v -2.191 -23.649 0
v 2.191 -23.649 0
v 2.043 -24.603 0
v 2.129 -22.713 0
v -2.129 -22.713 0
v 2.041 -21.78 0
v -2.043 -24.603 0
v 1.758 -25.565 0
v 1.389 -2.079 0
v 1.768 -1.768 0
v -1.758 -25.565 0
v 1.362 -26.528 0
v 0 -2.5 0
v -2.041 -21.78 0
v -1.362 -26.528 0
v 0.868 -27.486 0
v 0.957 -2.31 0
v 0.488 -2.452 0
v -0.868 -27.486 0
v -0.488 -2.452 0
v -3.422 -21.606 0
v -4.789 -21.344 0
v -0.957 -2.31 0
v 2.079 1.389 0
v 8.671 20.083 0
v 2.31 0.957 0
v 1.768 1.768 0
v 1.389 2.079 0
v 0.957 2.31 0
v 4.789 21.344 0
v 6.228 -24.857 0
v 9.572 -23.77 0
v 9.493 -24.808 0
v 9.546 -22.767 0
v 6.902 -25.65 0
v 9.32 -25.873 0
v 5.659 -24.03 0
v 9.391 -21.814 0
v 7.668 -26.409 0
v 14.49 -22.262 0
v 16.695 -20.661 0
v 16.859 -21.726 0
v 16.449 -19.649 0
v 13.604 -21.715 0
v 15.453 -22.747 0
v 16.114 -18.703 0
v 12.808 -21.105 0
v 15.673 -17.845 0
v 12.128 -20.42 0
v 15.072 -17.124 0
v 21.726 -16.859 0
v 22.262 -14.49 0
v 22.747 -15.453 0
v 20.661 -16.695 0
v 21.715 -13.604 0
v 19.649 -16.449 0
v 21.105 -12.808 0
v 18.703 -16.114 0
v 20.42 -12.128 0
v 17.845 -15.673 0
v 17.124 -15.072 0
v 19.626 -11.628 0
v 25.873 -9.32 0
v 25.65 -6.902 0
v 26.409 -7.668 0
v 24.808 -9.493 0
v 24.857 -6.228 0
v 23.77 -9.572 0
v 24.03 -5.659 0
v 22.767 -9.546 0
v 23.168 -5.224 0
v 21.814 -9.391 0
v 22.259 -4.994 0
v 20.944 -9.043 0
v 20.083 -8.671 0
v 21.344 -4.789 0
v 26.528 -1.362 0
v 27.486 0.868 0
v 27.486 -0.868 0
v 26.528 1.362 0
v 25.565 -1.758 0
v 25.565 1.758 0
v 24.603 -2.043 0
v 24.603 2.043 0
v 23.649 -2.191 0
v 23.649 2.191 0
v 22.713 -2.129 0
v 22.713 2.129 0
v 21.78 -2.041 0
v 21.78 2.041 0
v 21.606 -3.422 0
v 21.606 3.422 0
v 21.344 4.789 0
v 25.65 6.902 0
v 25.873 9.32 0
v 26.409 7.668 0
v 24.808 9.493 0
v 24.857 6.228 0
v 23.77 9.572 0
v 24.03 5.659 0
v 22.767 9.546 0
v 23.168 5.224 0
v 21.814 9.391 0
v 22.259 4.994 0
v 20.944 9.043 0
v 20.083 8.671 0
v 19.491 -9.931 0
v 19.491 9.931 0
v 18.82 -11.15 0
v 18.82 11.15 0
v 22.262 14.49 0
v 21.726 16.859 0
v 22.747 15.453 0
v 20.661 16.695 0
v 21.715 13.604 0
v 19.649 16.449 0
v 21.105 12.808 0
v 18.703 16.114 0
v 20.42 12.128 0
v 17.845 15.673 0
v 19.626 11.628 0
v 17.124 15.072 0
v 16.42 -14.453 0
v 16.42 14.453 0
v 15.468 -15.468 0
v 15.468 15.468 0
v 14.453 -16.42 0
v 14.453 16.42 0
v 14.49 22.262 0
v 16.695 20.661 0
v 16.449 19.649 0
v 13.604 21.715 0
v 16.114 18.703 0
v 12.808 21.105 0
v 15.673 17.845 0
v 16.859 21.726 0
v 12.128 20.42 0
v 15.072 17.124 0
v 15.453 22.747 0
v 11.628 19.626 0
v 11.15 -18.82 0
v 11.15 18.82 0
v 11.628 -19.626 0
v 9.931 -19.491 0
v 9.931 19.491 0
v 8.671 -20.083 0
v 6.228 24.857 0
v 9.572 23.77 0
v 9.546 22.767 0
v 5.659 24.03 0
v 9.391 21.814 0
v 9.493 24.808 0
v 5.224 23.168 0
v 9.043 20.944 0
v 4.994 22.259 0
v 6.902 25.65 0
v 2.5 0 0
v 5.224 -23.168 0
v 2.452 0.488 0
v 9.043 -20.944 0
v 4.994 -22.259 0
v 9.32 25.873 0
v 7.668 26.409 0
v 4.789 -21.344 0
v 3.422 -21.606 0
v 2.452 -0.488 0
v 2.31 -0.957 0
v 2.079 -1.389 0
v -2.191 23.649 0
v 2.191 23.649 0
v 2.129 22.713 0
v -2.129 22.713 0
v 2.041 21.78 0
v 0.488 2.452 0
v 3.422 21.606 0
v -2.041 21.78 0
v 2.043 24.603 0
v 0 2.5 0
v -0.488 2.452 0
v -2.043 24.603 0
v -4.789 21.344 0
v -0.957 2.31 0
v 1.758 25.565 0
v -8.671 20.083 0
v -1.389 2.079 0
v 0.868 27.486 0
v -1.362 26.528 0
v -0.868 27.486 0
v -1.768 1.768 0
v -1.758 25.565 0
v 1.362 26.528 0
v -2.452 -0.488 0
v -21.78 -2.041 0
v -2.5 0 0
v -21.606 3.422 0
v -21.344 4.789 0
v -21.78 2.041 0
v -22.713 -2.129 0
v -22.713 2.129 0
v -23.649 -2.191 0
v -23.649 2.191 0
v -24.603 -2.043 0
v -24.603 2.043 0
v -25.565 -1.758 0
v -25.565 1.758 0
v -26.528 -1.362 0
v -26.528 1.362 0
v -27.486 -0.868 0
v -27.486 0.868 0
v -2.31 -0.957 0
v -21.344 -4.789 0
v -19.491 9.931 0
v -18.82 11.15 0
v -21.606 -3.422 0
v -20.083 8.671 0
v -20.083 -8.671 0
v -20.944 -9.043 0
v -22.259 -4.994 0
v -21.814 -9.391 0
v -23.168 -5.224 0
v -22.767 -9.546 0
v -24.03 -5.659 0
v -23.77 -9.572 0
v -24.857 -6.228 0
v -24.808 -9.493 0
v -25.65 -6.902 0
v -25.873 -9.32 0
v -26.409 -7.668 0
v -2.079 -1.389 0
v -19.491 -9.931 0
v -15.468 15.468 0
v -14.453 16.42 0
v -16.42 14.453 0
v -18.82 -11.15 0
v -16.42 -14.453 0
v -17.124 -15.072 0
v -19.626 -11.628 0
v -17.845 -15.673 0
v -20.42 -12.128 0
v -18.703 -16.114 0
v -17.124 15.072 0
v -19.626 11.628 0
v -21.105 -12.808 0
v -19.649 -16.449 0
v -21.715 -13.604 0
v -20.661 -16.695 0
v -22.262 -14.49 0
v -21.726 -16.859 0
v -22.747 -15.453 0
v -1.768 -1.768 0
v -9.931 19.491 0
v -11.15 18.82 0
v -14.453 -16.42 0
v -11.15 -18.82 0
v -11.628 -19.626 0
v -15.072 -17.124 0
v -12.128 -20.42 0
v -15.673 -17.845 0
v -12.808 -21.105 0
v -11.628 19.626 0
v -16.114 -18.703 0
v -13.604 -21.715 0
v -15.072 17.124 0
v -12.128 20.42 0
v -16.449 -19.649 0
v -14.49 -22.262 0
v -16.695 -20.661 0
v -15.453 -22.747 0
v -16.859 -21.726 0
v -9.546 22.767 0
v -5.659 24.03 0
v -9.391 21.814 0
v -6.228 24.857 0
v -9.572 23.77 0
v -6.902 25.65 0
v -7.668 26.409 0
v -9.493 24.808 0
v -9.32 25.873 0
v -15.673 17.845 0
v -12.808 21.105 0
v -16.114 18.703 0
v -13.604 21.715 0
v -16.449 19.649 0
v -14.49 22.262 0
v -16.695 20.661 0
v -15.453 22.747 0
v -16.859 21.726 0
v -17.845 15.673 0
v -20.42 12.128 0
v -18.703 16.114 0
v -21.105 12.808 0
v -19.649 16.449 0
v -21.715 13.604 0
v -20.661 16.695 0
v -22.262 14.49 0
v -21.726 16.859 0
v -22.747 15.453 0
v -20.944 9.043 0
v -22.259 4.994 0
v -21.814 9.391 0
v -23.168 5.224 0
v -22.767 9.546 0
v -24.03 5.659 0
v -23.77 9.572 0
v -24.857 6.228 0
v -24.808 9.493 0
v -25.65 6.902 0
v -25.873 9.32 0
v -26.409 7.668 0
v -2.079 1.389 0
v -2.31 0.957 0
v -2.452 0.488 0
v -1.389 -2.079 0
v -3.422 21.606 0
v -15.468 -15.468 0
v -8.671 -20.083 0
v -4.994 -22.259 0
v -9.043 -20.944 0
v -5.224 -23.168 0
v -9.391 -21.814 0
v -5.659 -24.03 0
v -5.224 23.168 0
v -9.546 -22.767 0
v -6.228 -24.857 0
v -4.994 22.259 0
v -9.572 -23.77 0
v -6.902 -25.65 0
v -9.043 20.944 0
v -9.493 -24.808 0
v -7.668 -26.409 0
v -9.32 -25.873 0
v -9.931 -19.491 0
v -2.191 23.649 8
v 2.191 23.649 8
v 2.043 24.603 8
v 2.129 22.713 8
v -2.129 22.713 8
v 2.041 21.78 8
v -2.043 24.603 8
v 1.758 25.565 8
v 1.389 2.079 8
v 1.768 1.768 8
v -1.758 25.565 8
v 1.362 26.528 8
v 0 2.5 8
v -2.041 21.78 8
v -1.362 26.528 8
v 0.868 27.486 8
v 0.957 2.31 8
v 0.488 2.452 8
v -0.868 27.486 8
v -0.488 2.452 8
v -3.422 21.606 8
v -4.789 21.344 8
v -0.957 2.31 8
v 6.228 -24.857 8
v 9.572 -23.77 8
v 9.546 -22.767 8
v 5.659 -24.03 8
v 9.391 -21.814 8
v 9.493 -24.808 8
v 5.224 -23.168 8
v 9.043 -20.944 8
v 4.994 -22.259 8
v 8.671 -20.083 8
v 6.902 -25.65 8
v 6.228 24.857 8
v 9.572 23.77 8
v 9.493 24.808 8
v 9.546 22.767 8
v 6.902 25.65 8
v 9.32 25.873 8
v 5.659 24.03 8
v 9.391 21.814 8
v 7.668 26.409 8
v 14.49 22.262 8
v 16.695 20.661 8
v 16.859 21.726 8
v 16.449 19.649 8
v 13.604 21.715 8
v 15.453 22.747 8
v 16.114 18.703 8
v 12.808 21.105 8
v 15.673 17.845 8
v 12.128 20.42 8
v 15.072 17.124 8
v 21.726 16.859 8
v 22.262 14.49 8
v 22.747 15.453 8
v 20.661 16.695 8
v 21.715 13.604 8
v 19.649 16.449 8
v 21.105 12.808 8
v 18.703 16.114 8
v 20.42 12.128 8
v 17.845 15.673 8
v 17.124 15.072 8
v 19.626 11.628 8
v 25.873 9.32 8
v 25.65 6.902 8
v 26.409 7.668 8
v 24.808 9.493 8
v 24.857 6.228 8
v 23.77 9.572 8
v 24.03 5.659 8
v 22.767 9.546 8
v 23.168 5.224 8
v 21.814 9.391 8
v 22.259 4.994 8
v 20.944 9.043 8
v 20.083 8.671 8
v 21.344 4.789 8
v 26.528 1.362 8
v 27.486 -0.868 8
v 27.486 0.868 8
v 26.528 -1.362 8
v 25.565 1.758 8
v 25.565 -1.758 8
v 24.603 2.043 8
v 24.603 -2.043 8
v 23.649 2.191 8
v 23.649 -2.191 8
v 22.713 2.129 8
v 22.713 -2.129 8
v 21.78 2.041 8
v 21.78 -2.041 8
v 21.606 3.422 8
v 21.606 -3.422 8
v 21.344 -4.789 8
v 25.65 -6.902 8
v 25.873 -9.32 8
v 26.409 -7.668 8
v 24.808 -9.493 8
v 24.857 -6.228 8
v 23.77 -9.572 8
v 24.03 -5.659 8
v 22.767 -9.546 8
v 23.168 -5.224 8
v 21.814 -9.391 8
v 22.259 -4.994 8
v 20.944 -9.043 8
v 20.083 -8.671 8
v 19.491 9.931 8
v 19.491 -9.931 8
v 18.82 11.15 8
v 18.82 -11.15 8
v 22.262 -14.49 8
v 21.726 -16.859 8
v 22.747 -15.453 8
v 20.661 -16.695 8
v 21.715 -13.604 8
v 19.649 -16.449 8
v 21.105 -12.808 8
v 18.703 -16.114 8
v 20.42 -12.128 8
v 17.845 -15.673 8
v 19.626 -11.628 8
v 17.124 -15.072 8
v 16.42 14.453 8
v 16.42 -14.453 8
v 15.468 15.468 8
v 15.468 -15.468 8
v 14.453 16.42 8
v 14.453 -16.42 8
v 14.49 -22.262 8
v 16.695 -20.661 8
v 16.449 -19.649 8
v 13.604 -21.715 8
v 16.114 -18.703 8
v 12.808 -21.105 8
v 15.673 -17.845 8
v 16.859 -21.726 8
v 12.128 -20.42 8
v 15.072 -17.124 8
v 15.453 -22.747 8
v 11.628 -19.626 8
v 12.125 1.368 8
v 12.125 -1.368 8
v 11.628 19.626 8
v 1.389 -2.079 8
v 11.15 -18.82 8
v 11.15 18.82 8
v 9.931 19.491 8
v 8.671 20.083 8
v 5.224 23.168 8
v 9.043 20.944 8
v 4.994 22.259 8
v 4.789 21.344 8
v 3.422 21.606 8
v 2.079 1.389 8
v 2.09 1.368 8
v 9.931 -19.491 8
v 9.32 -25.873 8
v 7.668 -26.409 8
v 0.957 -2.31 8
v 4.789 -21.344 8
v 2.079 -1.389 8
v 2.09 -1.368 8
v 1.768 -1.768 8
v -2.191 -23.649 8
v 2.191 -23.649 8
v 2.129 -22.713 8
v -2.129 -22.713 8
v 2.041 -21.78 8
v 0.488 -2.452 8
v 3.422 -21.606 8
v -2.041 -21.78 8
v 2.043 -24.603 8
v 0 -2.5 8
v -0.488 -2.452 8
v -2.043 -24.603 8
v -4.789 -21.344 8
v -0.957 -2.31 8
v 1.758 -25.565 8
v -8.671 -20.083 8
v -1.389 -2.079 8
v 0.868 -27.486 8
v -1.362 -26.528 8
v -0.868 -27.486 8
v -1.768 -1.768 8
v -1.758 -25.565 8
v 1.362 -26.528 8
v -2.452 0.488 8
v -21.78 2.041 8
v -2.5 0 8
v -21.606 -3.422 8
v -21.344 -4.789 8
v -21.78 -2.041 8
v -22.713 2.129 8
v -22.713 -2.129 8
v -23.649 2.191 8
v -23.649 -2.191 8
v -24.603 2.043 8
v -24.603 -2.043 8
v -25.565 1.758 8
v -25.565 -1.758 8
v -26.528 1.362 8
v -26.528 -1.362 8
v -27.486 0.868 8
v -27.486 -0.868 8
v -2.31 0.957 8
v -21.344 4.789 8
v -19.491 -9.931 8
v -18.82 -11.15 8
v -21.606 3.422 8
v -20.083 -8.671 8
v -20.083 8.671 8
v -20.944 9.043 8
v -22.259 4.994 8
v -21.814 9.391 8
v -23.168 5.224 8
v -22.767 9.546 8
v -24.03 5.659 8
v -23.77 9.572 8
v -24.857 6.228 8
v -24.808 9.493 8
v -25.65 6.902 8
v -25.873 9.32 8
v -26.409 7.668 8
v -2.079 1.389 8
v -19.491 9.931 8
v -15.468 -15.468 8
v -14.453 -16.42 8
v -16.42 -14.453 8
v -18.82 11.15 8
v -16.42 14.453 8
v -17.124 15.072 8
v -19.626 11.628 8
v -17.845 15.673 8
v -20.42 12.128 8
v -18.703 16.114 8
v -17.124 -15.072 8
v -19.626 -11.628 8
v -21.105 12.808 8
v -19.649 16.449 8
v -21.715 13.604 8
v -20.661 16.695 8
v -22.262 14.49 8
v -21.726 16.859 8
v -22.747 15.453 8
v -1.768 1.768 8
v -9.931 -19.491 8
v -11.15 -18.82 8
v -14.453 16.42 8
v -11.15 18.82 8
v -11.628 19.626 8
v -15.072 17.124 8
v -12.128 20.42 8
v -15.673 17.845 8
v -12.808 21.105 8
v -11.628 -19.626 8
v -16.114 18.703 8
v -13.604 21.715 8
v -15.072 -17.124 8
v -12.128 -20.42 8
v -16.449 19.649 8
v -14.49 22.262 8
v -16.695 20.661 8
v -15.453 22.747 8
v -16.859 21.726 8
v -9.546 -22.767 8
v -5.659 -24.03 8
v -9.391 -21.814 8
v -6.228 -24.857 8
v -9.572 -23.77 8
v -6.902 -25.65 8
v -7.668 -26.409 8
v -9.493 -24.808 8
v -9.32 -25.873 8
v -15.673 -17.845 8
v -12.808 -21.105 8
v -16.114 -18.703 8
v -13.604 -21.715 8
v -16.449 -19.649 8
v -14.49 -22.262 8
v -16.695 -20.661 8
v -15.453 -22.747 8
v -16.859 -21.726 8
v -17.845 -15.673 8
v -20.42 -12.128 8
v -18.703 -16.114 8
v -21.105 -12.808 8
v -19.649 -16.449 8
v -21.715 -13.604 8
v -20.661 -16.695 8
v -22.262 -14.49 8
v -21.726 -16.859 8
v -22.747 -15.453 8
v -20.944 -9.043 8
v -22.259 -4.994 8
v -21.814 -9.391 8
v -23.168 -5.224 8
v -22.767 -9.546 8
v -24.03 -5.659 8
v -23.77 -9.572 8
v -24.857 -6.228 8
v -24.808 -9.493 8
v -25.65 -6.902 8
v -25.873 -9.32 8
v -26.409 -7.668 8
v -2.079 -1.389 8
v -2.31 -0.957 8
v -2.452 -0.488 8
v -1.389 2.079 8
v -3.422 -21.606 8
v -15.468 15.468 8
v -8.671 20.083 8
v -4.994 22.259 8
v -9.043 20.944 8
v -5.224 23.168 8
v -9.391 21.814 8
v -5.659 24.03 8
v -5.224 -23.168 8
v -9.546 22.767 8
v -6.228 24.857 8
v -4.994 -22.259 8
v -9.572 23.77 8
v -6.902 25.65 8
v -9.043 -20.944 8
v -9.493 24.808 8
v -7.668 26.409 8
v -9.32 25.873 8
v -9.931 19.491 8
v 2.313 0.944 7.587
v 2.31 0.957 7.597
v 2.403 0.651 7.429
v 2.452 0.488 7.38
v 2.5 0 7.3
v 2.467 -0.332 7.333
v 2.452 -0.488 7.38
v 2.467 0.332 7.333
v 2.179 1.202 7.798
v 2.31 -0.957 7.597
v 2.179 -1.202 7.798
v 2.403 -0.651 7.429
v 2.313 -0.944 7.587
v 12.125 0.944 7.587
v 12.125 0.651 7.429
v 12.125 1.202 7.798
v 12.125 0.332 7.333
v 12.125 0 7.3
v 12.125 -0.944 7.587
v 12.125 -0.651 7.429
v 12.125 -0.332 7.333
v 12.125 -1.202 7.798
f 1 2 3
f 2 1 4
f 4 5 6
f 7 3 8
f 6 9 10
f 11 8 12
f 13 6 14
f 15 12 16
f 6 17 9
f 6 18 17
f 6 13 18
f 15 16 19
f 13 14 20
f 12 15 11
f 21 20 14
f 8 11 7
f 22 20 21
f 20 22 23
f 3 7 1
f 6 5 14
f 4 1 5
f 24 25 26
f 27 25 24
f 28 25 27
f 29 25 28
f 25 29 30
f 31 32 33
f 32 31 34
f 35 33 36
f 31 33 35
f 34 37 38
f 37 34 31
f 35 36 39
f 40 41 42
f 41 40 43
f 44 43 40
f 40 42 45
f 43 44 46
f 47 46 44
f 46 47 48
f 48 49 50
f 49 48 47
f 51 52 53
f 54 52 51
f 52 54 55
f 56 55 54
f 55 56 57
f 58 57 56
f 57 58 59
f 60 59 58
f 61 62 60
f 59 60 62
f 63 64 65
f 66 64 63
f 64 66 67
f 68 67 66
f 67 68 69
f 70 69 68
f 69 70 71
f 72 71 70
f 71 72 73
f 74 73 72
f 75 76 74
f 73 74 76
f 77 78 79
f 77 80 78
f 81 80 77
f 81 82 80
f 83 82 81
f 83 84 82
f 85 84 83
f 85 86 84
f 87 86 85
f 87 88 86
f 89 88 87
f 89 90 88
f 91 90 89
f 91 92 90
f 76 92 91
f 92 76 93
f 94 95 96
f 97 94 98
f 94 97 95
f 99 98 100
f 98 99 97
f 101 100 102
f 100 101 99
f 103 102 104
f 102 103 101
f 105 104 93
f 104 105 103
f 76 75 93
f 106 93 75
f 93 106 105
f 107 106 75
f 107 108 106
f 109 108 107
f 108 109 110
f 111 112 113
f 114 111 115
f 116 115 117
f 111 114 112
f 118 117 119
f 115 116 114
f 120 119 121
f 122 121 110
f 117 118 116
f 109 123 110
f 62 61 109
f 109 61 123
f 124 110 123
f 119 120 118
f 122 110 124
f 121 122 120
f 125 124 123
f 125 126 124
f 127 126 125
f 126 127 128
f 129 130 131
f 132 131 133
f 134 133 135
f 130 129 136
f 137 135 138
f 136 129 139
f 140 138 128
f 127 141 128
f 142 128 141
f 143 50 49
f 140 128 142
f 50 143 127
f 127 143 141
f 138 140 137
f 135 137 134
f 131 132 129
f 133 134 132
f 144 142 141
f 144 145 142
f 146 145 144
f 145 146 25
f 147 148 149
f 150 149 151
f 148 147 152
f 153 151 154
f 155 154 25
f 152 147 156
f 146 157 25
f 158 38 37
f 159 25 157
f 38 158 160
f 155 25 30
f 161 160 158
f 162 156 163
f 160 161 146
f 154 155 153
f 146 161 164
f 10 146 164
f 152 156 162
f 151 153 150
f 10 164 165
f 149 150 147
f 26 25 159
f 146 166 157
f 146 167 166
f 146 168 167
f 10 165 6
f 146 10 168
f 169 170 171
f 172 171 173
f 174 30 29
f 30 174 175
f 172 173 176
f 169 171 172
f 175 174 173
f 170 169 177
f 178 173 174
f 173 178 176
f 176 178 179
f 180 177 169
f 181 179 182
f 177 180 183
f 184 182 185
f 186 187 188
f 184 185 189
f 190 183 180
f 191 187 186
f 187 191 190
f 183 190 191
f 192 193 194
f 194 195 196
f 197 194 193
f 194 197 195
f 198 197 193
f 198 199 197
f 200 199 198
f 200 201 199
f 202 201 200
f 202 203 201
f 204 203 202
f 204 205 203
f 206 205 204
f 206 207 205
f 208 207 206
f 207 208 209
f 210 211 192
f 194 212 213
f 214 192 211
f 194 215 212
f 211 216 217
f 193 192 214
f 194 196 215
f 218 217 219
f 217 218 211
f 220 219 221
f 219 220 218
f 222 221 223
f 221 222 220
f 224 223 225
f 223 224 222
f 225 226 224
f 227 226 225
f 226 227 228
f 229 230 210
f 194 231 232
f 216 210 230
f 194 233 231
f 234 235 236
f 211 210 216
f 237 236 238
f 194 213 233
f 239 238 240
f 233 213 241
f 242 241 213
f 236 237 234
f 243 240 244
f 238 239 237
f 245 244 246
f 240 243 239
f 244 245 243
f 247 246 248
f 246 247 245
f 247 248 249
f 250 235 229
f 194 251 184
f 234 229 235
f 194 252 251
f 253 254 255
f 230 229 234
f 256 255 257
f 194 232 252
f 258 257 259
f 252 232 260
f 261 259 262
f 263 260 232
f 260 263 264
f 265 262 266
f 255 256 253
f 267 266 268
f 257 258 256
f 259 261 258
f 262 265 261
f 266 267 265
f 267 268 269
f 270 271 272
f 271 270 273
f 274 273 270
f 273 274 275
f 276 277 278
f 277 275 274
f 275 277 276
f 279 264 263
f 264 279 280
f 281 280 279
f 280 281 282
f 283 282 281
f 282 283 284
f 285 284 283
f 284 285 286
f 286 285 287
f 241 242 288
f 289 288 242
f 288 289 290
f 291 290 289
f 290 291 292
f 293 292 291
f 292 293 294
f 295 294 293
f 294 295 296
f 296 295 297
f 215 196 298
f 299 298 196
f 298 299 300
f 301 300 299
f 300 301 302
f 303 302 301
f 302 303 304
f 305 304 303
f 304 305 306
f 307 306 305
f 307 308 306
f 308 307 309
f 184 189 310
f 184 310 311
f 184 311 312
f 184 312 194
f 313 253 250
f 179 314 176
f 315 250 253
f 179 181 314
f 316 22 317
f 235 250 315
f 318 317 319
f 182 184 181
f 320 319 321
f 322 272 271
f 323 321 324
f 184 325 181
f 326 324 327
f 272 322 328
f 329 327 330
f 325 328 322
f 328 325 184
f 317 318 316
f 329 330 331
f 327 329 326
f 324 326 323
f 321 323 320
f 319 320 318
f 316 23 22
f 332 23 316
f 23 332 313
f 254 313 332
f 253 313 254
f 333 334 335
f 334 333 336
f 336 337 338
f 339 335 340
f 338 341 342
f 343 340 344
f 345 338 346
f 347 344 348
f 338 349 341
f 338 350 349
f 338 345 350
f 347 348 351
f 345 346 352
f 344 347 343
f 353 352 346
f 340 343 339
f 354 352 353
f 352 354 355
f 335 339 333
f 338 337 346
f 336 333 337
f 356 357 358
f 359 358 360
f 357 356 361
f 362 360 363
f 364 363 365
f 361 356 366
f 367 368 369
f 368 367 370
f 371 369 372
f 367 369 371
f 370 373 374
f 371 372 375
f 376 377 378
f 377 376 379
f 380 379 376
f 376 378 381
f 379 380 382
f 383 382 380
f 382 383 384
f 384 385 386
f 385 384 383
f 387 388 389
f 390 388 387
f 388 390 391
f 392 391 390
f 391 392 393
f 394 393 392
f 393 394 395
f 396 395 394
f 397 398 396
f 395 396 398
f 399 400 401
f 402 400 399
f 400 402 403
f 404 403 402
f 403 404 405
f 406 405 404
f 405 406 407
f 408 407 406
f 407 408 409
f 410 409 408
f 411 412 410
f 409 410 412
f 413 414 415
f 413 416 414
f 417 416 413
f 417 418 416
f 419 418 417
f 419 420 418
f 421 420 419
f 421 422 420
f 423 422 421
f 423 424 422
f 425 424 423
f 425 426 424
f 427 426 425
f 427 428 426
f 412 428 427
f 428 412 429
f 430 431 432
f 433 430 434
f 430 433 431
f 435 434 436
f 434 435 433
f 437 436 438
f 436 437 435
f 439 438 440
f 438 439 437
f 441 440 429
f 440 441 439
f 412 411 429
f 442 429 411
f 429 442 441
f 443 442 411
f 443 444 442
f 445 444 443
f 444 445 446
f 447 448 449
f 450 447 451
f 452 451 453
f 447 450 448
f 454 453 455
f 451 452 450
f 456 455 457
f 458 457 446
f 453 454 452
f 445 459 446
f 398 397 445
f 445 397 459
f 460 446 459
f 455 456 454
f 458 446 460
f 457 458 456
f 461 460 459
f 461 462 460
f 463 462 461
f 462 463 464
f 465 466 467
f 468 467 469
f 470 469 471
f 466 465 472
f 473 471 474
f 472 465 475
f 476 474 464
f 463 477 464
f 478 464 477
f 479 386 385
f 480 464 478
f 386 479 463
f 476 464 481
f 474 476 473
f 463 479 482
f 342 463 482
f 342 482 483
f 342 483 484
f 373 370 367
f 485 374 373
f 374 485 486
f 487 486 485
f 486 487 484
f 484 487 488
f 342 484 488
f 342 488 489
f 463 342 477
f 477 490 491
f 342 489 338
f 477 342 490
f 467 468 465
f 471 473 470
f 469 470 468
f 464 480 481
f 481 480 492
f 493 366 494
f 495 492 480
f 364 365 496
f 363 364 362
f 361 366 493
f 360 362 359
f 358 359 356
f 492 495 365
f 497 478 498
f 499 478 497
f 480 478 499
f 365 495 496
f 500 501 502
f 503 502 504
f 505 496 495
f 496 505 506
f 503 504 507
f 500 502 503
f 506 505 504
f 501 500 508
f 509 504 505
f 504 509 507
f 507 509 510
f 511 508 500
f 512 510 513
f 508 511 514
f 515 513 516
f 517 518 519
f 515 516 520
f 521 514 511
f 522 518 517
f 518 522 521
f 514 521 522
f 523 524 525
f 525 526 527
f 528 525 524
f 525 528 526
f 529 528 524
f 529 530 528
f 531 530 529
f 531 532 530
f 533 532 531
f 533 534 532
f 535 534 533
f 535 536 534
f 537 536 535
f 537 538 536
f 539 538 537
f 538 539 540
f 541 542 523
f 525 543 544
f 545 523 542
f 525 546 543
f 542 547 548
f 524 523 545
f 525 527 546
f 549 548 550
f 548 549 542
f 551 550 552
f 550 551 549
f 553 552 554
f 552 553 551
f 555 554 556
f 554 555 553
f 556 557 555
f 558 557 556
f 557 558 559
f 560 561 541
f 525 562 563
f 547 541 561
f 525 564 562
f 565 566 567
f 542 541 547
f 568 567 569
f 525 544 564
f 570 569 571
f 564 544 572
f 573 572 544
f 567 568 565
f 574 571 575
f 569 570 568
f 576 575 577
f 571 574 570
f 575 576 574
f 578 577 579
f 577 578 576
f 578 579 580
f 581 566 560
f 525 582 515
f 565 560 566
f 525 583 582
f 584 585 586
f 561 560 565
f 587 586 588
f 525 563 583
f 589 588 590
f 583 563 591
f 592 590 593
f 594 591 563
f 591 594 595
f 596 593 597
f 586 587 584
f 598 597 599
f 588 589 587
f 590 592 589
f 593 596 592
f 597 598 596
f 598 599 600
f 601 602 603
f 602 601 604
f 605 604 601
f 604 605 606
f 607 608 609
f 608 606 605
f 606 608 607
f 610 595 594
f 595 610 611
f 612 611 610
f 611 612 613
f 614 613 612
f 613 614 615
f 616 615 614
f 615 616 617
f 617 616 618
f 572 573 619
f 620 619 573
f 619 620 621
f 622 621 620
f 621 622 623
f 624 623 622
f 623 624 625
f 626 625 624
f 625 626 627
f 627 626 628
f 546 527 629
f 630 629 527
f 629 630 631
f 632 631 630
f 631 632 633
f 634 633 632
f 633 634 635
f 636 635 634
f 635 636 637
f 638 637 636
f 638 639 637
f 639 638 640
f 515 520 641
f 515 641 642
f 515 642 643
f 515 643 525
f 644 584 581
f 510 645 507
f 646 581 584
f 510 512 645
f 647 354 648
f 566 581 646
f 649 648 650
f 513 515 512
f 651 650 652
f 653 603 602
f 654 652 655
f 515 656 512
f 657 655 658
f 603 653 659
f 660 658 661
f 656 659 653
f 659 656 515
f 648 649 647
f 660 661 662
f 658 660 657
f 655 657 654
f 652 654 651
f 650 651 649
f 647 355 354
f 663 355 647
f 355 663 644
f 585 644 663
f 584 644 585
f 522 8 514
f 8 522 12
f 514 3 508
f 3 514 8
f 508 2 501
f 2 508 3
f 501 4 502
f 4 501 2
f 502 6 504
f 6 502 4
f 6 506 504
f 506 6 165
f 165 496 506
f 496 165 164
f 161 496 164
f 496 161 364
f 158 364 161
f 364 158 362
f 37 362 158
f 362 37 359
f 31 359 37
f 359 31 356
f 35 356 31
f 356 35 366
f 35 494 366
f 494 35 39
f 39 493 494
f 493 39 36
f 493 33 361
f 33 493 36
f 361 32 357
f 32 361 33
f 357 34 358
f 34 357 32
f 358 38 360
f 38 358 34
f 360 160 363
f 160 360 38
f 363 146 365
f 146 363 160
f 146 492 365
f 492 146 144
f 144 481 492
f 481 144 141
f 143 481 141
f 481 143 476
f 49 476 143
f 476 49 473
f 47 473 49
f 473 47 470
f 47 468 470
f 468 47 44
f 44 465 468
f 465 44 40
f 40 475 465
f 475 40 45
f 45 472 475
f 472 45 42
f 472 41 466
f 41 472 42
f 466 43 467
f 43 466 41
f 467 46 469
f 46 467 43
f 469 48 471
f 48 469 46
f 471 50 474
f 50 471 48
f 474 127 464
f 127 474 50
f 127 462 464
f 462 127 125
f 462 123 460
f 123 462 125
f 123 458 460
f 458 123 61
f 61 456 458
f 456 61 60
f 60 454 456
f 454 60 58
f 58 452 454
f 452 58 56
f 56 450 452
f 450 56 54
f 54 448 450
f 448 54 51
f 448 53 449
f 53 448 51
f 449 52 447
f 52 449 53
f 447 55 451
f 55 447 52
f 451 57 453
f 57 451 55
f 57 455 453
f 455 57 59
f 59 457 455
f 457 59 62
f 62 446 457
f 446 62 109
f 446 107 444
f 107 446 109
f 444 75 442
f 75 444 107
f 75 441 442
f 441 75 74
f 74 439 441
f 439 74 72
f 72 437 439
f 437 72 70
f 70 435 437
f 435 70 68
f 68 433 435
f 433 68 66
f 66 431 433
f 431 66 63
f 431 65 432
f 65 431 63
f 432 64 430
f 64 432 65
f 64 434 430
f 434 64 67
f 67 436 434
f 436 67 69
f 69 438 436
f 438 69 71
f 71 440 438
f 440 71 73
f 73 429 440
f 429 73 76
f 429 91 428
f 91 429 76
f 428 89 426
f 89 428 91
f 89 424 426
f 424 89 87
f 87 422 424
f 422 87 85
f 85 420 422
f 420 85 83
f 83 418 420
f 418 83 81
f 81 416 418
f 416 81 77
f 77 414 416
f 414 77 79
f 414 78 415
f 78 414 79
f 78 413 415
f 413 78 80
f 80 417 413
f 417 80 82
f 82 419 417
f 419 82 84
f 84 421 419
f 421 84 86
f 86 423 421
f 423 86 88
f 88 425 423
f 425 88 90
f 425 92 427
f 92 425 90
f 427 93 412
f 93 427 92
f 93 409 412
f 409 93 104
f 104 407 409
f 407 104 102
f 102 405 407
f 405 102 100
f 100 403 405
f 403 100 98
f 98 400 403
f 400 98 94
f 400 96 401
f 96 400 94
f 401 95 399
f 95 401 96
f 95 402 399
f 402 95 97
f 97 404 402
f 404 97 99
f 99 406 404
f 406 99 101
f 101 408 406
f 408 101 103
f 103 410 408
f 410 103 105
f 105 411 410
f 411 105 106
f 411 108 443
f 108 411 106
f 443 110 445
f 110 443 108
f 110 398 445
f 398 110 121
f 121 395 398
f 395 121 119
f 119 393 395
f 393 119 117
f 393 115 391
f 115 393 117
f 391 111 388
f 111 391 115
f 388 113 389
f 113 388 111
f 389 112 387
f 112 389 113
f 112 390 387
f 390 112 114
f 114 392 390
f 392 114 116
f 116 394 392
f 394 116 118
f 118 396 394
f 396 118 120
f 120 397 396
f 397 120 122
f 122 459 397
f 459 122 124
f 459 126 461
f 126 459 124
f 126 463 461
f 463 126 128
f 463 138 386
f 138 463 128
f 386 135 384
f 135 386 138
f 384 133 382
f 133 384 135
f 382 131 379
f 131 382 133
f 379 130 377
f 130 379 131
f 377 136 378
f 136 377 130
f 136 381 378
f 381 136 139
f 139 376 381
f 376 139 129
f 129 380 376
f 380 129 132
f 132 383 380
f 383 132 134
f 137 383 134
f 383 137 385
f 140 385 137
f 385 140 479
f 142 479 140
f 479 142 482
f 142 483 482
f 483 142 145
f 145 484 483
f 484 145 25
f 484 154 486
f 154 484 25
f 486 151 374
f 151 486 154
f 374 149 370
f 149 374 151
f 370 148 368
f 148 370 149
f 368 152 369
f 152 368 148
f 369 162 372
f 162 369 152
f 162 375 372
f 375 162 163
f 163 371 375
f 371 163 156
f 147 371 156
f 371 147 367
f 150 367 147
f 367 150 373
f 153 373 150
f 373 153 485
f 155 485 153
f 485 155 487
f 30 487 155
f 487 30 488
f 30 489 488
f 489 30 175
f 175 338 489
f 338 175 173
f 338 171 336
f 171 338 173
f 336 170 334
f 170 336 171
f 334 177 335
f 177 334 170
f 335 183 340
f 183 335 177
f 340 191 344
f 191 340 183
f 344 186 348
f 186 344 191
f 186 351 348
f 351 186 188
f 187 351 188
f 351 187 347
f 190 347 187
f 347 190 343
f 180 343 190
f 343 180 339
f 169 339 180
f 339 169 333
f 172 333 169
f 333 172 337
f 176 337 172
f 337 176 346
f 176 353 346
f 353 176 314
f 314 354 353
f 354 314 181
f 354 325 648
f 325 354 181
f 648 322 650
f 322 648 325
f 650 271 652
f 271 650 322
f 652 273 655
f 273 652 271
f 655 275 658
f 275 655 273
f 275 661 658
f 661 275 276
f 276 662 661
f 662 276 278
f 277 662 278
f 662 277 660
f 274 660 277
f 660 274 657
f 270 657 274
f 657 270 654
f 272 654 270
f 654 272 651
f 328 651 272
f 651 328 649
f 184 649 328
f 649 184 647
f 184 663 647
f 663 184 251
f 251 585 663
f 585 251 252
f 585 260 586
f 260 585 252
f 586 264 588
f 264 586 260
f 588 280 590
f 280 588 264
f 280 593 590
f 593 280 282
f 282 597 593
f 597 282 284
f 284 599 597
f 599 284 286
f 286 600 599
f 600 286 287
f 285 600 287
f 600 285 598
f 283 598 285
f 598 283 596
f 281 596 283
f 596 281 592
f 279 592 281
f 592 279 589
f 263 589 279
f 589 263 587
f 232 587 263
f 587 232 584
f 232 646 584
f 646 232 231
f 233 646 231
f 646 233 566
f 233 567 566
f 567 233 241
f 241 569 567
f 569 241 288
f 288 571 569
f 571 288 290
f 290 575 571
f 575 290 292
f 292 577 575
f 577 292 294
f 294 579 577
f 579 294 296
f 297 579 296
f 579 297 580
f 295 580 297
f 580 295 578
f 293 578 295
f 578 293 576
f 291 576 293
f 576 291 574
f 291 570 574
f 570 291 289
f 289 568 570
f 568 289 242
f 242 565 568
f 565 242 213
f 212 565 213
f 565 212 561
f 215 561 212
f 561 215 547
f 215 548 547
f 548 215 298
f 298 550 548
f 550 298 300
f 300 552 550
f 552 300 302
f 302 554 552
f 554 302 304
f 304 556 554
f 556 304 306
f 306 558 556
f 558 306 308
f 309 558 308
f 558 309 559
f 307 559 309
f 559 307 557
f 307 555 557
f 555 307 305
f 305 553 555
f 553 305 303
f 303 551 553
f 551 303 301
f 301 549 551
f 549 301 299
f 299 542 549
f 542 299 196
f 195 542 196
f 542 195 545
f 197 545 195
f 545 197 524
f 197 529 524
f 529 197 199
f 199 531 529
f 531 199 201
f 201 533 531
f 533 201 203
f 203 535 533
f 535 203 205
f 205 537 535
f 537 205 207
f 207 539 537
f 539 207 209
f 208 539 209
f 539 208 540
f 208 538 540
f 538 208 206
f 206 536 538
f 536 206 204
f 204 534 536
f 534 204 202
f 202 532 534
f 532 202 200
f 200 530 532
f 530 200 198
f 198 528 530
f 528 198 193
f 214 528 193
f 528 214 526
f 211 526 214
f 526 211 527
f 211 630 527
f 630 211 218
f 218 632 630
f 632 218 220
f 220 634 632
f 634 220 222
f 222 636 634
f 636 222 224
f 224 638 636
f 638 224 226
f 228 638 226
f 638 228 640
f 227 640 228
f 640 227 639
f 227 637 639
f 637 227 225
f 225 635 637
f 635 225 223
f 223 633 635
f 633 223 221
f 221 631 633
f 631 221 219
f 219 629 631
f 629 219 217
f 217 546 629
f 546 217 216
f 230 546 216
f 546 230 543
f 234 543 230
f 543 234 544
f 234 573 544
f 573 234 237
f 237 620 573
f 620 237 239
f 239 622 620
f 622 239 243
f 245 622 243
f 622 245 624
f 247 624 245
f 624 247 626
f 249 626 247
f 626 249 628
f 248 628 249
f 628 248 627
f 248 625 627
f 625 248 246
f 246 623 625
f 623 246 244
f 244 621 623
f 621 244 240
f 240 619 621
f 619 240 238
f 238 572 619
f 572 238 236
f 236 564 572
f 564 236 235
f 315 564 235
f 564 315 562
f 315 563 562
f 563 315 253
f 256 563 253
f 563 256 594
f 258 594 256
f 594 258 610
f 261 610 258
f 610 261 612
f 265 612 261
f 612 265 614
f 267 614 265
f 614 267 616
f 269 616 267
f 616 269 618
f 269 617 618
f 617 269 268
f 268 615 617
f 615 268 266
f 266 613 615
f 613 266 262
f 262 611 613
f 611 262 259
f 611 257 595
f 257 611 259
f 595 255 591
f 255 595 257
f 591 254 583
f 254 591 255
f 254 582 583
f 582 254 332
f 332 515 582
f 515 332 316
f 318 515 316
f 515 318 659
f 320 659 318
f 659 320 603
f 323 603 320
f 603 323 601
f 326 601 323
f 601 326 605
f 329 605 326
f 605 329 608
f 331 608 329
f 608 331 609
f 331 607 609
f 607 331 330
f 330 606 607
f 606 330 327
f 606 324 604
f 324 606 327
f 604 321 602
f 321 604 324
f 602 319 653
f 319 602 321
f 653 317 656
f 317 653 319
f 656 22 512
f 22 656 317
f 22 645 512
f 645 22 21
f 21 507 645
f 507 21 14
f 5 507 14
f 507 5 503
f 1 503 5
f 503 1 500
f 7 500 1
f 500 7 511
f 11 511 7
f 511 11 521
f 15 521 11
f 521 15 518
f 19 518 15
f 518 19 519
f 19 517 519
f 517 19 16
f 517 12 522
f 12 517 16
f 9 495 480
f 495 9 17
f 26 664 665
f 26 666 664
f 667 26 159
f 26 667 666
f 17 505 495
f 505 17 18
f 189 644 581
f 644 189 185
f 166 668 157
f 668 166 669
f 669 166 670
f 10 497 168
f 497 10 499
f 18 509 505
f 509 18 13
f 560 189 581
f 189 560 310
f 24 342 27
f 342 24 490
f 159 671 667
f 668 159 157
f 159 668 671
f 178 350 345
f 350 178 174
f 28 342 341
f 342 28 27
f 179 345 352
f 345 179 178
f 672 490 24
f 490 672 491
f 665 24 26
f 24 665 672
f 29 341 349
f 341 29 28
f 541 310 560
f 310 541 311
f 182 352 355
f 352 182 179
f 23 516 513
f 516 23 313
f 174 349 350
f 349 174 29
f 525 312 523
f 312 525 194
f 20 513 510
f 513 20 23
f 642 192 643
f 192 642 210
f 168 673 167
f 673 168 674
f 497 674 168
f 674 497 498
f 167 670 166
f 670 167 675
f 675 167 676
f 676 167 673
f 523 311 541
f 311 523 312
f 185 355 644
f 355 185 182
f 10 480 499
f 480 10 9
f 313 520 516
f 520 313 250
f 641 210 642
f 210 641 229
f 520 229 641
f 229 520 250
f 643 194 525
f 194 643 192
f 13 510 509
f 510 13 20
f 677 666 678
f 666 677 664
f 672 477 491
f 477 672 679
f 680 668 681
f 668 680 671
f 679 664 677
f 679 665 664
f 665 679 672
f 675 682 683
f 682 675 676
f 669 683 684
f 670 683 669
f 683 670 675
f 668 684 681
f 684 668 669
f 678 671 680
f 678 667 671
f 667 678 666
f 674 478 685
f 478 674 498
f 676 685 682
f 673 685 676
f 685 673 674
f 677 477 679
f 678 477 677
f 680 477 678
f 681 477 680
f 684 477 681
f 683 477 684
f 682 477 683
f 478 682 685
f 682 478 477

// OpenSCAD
$fn = 32;

// ----------------------------------------------------------------------
// Spur gear: m=2.5 z=20, 55 mm tip diameter x 8 mm
// ----------------------------------------------------------------------

// --- parameters (mm) ---
module_m = 2.5;           // module
teeth = 20;               // number of teeth
face_w = 8;               // face width
pa = 20;                  // pressure angle, deg
bore_d = 5;               // shaft bore
set_d = 3.4;              // set screw tap hole
set_z = 9;                // set screw height

/* --- involute profile --- */
pitch_r = module_m * teeth / 2;
base_r = pitch_r * cos(pa);
tip_r = pitch_r + module_m;
root_r = pitch_r - 1.25 * module_m;
flank_steps = 6;

function inv_deg(a) = (tan(a) - a * PI / 180) * 180 / PI;
function flank_r(i) = root_r + (tip_r - root_r) * i / flank_steps;
function half_angle(r) = 90 / teeth + inv_deg(pa) - inv_deg(acos(min(1, base_r / r)));
function tooth_pt(k, i, side) =
    let (r = flank_r(i), a = k * 360 / teeth + side * half_angle(r))
    [r * cos(a), r * sin(a)];

module tooth_profile() {
  polygon(points = [
    for (k = [0 : teeth - 1])
      each [
        for (i = [0 : flank_steps]) tooth_pt(k, i, -1),
        for (i = [flank_steps : -1 : 0]) tooth_pt(k, i, 1),
        let (ta = (k + 0.5) * 360 / teeth)
          [root_r * cos(ta), root_r * sin(ta)]
      ]
  ]);
}

module gear_disc() {
  linear_extrude(height = face_w) tooth_profile();
}

difference() {
  gear_disc();
  translate([0, 0, -1]) cylinder(h = face_w + 3, d = bore_d);
  /* set screw, drilled radially */
  translate([-1, 0, set_z]) rotate([0, 90, 0]) cylinder(h = (root_r * 0.6), d = set_d);
}
